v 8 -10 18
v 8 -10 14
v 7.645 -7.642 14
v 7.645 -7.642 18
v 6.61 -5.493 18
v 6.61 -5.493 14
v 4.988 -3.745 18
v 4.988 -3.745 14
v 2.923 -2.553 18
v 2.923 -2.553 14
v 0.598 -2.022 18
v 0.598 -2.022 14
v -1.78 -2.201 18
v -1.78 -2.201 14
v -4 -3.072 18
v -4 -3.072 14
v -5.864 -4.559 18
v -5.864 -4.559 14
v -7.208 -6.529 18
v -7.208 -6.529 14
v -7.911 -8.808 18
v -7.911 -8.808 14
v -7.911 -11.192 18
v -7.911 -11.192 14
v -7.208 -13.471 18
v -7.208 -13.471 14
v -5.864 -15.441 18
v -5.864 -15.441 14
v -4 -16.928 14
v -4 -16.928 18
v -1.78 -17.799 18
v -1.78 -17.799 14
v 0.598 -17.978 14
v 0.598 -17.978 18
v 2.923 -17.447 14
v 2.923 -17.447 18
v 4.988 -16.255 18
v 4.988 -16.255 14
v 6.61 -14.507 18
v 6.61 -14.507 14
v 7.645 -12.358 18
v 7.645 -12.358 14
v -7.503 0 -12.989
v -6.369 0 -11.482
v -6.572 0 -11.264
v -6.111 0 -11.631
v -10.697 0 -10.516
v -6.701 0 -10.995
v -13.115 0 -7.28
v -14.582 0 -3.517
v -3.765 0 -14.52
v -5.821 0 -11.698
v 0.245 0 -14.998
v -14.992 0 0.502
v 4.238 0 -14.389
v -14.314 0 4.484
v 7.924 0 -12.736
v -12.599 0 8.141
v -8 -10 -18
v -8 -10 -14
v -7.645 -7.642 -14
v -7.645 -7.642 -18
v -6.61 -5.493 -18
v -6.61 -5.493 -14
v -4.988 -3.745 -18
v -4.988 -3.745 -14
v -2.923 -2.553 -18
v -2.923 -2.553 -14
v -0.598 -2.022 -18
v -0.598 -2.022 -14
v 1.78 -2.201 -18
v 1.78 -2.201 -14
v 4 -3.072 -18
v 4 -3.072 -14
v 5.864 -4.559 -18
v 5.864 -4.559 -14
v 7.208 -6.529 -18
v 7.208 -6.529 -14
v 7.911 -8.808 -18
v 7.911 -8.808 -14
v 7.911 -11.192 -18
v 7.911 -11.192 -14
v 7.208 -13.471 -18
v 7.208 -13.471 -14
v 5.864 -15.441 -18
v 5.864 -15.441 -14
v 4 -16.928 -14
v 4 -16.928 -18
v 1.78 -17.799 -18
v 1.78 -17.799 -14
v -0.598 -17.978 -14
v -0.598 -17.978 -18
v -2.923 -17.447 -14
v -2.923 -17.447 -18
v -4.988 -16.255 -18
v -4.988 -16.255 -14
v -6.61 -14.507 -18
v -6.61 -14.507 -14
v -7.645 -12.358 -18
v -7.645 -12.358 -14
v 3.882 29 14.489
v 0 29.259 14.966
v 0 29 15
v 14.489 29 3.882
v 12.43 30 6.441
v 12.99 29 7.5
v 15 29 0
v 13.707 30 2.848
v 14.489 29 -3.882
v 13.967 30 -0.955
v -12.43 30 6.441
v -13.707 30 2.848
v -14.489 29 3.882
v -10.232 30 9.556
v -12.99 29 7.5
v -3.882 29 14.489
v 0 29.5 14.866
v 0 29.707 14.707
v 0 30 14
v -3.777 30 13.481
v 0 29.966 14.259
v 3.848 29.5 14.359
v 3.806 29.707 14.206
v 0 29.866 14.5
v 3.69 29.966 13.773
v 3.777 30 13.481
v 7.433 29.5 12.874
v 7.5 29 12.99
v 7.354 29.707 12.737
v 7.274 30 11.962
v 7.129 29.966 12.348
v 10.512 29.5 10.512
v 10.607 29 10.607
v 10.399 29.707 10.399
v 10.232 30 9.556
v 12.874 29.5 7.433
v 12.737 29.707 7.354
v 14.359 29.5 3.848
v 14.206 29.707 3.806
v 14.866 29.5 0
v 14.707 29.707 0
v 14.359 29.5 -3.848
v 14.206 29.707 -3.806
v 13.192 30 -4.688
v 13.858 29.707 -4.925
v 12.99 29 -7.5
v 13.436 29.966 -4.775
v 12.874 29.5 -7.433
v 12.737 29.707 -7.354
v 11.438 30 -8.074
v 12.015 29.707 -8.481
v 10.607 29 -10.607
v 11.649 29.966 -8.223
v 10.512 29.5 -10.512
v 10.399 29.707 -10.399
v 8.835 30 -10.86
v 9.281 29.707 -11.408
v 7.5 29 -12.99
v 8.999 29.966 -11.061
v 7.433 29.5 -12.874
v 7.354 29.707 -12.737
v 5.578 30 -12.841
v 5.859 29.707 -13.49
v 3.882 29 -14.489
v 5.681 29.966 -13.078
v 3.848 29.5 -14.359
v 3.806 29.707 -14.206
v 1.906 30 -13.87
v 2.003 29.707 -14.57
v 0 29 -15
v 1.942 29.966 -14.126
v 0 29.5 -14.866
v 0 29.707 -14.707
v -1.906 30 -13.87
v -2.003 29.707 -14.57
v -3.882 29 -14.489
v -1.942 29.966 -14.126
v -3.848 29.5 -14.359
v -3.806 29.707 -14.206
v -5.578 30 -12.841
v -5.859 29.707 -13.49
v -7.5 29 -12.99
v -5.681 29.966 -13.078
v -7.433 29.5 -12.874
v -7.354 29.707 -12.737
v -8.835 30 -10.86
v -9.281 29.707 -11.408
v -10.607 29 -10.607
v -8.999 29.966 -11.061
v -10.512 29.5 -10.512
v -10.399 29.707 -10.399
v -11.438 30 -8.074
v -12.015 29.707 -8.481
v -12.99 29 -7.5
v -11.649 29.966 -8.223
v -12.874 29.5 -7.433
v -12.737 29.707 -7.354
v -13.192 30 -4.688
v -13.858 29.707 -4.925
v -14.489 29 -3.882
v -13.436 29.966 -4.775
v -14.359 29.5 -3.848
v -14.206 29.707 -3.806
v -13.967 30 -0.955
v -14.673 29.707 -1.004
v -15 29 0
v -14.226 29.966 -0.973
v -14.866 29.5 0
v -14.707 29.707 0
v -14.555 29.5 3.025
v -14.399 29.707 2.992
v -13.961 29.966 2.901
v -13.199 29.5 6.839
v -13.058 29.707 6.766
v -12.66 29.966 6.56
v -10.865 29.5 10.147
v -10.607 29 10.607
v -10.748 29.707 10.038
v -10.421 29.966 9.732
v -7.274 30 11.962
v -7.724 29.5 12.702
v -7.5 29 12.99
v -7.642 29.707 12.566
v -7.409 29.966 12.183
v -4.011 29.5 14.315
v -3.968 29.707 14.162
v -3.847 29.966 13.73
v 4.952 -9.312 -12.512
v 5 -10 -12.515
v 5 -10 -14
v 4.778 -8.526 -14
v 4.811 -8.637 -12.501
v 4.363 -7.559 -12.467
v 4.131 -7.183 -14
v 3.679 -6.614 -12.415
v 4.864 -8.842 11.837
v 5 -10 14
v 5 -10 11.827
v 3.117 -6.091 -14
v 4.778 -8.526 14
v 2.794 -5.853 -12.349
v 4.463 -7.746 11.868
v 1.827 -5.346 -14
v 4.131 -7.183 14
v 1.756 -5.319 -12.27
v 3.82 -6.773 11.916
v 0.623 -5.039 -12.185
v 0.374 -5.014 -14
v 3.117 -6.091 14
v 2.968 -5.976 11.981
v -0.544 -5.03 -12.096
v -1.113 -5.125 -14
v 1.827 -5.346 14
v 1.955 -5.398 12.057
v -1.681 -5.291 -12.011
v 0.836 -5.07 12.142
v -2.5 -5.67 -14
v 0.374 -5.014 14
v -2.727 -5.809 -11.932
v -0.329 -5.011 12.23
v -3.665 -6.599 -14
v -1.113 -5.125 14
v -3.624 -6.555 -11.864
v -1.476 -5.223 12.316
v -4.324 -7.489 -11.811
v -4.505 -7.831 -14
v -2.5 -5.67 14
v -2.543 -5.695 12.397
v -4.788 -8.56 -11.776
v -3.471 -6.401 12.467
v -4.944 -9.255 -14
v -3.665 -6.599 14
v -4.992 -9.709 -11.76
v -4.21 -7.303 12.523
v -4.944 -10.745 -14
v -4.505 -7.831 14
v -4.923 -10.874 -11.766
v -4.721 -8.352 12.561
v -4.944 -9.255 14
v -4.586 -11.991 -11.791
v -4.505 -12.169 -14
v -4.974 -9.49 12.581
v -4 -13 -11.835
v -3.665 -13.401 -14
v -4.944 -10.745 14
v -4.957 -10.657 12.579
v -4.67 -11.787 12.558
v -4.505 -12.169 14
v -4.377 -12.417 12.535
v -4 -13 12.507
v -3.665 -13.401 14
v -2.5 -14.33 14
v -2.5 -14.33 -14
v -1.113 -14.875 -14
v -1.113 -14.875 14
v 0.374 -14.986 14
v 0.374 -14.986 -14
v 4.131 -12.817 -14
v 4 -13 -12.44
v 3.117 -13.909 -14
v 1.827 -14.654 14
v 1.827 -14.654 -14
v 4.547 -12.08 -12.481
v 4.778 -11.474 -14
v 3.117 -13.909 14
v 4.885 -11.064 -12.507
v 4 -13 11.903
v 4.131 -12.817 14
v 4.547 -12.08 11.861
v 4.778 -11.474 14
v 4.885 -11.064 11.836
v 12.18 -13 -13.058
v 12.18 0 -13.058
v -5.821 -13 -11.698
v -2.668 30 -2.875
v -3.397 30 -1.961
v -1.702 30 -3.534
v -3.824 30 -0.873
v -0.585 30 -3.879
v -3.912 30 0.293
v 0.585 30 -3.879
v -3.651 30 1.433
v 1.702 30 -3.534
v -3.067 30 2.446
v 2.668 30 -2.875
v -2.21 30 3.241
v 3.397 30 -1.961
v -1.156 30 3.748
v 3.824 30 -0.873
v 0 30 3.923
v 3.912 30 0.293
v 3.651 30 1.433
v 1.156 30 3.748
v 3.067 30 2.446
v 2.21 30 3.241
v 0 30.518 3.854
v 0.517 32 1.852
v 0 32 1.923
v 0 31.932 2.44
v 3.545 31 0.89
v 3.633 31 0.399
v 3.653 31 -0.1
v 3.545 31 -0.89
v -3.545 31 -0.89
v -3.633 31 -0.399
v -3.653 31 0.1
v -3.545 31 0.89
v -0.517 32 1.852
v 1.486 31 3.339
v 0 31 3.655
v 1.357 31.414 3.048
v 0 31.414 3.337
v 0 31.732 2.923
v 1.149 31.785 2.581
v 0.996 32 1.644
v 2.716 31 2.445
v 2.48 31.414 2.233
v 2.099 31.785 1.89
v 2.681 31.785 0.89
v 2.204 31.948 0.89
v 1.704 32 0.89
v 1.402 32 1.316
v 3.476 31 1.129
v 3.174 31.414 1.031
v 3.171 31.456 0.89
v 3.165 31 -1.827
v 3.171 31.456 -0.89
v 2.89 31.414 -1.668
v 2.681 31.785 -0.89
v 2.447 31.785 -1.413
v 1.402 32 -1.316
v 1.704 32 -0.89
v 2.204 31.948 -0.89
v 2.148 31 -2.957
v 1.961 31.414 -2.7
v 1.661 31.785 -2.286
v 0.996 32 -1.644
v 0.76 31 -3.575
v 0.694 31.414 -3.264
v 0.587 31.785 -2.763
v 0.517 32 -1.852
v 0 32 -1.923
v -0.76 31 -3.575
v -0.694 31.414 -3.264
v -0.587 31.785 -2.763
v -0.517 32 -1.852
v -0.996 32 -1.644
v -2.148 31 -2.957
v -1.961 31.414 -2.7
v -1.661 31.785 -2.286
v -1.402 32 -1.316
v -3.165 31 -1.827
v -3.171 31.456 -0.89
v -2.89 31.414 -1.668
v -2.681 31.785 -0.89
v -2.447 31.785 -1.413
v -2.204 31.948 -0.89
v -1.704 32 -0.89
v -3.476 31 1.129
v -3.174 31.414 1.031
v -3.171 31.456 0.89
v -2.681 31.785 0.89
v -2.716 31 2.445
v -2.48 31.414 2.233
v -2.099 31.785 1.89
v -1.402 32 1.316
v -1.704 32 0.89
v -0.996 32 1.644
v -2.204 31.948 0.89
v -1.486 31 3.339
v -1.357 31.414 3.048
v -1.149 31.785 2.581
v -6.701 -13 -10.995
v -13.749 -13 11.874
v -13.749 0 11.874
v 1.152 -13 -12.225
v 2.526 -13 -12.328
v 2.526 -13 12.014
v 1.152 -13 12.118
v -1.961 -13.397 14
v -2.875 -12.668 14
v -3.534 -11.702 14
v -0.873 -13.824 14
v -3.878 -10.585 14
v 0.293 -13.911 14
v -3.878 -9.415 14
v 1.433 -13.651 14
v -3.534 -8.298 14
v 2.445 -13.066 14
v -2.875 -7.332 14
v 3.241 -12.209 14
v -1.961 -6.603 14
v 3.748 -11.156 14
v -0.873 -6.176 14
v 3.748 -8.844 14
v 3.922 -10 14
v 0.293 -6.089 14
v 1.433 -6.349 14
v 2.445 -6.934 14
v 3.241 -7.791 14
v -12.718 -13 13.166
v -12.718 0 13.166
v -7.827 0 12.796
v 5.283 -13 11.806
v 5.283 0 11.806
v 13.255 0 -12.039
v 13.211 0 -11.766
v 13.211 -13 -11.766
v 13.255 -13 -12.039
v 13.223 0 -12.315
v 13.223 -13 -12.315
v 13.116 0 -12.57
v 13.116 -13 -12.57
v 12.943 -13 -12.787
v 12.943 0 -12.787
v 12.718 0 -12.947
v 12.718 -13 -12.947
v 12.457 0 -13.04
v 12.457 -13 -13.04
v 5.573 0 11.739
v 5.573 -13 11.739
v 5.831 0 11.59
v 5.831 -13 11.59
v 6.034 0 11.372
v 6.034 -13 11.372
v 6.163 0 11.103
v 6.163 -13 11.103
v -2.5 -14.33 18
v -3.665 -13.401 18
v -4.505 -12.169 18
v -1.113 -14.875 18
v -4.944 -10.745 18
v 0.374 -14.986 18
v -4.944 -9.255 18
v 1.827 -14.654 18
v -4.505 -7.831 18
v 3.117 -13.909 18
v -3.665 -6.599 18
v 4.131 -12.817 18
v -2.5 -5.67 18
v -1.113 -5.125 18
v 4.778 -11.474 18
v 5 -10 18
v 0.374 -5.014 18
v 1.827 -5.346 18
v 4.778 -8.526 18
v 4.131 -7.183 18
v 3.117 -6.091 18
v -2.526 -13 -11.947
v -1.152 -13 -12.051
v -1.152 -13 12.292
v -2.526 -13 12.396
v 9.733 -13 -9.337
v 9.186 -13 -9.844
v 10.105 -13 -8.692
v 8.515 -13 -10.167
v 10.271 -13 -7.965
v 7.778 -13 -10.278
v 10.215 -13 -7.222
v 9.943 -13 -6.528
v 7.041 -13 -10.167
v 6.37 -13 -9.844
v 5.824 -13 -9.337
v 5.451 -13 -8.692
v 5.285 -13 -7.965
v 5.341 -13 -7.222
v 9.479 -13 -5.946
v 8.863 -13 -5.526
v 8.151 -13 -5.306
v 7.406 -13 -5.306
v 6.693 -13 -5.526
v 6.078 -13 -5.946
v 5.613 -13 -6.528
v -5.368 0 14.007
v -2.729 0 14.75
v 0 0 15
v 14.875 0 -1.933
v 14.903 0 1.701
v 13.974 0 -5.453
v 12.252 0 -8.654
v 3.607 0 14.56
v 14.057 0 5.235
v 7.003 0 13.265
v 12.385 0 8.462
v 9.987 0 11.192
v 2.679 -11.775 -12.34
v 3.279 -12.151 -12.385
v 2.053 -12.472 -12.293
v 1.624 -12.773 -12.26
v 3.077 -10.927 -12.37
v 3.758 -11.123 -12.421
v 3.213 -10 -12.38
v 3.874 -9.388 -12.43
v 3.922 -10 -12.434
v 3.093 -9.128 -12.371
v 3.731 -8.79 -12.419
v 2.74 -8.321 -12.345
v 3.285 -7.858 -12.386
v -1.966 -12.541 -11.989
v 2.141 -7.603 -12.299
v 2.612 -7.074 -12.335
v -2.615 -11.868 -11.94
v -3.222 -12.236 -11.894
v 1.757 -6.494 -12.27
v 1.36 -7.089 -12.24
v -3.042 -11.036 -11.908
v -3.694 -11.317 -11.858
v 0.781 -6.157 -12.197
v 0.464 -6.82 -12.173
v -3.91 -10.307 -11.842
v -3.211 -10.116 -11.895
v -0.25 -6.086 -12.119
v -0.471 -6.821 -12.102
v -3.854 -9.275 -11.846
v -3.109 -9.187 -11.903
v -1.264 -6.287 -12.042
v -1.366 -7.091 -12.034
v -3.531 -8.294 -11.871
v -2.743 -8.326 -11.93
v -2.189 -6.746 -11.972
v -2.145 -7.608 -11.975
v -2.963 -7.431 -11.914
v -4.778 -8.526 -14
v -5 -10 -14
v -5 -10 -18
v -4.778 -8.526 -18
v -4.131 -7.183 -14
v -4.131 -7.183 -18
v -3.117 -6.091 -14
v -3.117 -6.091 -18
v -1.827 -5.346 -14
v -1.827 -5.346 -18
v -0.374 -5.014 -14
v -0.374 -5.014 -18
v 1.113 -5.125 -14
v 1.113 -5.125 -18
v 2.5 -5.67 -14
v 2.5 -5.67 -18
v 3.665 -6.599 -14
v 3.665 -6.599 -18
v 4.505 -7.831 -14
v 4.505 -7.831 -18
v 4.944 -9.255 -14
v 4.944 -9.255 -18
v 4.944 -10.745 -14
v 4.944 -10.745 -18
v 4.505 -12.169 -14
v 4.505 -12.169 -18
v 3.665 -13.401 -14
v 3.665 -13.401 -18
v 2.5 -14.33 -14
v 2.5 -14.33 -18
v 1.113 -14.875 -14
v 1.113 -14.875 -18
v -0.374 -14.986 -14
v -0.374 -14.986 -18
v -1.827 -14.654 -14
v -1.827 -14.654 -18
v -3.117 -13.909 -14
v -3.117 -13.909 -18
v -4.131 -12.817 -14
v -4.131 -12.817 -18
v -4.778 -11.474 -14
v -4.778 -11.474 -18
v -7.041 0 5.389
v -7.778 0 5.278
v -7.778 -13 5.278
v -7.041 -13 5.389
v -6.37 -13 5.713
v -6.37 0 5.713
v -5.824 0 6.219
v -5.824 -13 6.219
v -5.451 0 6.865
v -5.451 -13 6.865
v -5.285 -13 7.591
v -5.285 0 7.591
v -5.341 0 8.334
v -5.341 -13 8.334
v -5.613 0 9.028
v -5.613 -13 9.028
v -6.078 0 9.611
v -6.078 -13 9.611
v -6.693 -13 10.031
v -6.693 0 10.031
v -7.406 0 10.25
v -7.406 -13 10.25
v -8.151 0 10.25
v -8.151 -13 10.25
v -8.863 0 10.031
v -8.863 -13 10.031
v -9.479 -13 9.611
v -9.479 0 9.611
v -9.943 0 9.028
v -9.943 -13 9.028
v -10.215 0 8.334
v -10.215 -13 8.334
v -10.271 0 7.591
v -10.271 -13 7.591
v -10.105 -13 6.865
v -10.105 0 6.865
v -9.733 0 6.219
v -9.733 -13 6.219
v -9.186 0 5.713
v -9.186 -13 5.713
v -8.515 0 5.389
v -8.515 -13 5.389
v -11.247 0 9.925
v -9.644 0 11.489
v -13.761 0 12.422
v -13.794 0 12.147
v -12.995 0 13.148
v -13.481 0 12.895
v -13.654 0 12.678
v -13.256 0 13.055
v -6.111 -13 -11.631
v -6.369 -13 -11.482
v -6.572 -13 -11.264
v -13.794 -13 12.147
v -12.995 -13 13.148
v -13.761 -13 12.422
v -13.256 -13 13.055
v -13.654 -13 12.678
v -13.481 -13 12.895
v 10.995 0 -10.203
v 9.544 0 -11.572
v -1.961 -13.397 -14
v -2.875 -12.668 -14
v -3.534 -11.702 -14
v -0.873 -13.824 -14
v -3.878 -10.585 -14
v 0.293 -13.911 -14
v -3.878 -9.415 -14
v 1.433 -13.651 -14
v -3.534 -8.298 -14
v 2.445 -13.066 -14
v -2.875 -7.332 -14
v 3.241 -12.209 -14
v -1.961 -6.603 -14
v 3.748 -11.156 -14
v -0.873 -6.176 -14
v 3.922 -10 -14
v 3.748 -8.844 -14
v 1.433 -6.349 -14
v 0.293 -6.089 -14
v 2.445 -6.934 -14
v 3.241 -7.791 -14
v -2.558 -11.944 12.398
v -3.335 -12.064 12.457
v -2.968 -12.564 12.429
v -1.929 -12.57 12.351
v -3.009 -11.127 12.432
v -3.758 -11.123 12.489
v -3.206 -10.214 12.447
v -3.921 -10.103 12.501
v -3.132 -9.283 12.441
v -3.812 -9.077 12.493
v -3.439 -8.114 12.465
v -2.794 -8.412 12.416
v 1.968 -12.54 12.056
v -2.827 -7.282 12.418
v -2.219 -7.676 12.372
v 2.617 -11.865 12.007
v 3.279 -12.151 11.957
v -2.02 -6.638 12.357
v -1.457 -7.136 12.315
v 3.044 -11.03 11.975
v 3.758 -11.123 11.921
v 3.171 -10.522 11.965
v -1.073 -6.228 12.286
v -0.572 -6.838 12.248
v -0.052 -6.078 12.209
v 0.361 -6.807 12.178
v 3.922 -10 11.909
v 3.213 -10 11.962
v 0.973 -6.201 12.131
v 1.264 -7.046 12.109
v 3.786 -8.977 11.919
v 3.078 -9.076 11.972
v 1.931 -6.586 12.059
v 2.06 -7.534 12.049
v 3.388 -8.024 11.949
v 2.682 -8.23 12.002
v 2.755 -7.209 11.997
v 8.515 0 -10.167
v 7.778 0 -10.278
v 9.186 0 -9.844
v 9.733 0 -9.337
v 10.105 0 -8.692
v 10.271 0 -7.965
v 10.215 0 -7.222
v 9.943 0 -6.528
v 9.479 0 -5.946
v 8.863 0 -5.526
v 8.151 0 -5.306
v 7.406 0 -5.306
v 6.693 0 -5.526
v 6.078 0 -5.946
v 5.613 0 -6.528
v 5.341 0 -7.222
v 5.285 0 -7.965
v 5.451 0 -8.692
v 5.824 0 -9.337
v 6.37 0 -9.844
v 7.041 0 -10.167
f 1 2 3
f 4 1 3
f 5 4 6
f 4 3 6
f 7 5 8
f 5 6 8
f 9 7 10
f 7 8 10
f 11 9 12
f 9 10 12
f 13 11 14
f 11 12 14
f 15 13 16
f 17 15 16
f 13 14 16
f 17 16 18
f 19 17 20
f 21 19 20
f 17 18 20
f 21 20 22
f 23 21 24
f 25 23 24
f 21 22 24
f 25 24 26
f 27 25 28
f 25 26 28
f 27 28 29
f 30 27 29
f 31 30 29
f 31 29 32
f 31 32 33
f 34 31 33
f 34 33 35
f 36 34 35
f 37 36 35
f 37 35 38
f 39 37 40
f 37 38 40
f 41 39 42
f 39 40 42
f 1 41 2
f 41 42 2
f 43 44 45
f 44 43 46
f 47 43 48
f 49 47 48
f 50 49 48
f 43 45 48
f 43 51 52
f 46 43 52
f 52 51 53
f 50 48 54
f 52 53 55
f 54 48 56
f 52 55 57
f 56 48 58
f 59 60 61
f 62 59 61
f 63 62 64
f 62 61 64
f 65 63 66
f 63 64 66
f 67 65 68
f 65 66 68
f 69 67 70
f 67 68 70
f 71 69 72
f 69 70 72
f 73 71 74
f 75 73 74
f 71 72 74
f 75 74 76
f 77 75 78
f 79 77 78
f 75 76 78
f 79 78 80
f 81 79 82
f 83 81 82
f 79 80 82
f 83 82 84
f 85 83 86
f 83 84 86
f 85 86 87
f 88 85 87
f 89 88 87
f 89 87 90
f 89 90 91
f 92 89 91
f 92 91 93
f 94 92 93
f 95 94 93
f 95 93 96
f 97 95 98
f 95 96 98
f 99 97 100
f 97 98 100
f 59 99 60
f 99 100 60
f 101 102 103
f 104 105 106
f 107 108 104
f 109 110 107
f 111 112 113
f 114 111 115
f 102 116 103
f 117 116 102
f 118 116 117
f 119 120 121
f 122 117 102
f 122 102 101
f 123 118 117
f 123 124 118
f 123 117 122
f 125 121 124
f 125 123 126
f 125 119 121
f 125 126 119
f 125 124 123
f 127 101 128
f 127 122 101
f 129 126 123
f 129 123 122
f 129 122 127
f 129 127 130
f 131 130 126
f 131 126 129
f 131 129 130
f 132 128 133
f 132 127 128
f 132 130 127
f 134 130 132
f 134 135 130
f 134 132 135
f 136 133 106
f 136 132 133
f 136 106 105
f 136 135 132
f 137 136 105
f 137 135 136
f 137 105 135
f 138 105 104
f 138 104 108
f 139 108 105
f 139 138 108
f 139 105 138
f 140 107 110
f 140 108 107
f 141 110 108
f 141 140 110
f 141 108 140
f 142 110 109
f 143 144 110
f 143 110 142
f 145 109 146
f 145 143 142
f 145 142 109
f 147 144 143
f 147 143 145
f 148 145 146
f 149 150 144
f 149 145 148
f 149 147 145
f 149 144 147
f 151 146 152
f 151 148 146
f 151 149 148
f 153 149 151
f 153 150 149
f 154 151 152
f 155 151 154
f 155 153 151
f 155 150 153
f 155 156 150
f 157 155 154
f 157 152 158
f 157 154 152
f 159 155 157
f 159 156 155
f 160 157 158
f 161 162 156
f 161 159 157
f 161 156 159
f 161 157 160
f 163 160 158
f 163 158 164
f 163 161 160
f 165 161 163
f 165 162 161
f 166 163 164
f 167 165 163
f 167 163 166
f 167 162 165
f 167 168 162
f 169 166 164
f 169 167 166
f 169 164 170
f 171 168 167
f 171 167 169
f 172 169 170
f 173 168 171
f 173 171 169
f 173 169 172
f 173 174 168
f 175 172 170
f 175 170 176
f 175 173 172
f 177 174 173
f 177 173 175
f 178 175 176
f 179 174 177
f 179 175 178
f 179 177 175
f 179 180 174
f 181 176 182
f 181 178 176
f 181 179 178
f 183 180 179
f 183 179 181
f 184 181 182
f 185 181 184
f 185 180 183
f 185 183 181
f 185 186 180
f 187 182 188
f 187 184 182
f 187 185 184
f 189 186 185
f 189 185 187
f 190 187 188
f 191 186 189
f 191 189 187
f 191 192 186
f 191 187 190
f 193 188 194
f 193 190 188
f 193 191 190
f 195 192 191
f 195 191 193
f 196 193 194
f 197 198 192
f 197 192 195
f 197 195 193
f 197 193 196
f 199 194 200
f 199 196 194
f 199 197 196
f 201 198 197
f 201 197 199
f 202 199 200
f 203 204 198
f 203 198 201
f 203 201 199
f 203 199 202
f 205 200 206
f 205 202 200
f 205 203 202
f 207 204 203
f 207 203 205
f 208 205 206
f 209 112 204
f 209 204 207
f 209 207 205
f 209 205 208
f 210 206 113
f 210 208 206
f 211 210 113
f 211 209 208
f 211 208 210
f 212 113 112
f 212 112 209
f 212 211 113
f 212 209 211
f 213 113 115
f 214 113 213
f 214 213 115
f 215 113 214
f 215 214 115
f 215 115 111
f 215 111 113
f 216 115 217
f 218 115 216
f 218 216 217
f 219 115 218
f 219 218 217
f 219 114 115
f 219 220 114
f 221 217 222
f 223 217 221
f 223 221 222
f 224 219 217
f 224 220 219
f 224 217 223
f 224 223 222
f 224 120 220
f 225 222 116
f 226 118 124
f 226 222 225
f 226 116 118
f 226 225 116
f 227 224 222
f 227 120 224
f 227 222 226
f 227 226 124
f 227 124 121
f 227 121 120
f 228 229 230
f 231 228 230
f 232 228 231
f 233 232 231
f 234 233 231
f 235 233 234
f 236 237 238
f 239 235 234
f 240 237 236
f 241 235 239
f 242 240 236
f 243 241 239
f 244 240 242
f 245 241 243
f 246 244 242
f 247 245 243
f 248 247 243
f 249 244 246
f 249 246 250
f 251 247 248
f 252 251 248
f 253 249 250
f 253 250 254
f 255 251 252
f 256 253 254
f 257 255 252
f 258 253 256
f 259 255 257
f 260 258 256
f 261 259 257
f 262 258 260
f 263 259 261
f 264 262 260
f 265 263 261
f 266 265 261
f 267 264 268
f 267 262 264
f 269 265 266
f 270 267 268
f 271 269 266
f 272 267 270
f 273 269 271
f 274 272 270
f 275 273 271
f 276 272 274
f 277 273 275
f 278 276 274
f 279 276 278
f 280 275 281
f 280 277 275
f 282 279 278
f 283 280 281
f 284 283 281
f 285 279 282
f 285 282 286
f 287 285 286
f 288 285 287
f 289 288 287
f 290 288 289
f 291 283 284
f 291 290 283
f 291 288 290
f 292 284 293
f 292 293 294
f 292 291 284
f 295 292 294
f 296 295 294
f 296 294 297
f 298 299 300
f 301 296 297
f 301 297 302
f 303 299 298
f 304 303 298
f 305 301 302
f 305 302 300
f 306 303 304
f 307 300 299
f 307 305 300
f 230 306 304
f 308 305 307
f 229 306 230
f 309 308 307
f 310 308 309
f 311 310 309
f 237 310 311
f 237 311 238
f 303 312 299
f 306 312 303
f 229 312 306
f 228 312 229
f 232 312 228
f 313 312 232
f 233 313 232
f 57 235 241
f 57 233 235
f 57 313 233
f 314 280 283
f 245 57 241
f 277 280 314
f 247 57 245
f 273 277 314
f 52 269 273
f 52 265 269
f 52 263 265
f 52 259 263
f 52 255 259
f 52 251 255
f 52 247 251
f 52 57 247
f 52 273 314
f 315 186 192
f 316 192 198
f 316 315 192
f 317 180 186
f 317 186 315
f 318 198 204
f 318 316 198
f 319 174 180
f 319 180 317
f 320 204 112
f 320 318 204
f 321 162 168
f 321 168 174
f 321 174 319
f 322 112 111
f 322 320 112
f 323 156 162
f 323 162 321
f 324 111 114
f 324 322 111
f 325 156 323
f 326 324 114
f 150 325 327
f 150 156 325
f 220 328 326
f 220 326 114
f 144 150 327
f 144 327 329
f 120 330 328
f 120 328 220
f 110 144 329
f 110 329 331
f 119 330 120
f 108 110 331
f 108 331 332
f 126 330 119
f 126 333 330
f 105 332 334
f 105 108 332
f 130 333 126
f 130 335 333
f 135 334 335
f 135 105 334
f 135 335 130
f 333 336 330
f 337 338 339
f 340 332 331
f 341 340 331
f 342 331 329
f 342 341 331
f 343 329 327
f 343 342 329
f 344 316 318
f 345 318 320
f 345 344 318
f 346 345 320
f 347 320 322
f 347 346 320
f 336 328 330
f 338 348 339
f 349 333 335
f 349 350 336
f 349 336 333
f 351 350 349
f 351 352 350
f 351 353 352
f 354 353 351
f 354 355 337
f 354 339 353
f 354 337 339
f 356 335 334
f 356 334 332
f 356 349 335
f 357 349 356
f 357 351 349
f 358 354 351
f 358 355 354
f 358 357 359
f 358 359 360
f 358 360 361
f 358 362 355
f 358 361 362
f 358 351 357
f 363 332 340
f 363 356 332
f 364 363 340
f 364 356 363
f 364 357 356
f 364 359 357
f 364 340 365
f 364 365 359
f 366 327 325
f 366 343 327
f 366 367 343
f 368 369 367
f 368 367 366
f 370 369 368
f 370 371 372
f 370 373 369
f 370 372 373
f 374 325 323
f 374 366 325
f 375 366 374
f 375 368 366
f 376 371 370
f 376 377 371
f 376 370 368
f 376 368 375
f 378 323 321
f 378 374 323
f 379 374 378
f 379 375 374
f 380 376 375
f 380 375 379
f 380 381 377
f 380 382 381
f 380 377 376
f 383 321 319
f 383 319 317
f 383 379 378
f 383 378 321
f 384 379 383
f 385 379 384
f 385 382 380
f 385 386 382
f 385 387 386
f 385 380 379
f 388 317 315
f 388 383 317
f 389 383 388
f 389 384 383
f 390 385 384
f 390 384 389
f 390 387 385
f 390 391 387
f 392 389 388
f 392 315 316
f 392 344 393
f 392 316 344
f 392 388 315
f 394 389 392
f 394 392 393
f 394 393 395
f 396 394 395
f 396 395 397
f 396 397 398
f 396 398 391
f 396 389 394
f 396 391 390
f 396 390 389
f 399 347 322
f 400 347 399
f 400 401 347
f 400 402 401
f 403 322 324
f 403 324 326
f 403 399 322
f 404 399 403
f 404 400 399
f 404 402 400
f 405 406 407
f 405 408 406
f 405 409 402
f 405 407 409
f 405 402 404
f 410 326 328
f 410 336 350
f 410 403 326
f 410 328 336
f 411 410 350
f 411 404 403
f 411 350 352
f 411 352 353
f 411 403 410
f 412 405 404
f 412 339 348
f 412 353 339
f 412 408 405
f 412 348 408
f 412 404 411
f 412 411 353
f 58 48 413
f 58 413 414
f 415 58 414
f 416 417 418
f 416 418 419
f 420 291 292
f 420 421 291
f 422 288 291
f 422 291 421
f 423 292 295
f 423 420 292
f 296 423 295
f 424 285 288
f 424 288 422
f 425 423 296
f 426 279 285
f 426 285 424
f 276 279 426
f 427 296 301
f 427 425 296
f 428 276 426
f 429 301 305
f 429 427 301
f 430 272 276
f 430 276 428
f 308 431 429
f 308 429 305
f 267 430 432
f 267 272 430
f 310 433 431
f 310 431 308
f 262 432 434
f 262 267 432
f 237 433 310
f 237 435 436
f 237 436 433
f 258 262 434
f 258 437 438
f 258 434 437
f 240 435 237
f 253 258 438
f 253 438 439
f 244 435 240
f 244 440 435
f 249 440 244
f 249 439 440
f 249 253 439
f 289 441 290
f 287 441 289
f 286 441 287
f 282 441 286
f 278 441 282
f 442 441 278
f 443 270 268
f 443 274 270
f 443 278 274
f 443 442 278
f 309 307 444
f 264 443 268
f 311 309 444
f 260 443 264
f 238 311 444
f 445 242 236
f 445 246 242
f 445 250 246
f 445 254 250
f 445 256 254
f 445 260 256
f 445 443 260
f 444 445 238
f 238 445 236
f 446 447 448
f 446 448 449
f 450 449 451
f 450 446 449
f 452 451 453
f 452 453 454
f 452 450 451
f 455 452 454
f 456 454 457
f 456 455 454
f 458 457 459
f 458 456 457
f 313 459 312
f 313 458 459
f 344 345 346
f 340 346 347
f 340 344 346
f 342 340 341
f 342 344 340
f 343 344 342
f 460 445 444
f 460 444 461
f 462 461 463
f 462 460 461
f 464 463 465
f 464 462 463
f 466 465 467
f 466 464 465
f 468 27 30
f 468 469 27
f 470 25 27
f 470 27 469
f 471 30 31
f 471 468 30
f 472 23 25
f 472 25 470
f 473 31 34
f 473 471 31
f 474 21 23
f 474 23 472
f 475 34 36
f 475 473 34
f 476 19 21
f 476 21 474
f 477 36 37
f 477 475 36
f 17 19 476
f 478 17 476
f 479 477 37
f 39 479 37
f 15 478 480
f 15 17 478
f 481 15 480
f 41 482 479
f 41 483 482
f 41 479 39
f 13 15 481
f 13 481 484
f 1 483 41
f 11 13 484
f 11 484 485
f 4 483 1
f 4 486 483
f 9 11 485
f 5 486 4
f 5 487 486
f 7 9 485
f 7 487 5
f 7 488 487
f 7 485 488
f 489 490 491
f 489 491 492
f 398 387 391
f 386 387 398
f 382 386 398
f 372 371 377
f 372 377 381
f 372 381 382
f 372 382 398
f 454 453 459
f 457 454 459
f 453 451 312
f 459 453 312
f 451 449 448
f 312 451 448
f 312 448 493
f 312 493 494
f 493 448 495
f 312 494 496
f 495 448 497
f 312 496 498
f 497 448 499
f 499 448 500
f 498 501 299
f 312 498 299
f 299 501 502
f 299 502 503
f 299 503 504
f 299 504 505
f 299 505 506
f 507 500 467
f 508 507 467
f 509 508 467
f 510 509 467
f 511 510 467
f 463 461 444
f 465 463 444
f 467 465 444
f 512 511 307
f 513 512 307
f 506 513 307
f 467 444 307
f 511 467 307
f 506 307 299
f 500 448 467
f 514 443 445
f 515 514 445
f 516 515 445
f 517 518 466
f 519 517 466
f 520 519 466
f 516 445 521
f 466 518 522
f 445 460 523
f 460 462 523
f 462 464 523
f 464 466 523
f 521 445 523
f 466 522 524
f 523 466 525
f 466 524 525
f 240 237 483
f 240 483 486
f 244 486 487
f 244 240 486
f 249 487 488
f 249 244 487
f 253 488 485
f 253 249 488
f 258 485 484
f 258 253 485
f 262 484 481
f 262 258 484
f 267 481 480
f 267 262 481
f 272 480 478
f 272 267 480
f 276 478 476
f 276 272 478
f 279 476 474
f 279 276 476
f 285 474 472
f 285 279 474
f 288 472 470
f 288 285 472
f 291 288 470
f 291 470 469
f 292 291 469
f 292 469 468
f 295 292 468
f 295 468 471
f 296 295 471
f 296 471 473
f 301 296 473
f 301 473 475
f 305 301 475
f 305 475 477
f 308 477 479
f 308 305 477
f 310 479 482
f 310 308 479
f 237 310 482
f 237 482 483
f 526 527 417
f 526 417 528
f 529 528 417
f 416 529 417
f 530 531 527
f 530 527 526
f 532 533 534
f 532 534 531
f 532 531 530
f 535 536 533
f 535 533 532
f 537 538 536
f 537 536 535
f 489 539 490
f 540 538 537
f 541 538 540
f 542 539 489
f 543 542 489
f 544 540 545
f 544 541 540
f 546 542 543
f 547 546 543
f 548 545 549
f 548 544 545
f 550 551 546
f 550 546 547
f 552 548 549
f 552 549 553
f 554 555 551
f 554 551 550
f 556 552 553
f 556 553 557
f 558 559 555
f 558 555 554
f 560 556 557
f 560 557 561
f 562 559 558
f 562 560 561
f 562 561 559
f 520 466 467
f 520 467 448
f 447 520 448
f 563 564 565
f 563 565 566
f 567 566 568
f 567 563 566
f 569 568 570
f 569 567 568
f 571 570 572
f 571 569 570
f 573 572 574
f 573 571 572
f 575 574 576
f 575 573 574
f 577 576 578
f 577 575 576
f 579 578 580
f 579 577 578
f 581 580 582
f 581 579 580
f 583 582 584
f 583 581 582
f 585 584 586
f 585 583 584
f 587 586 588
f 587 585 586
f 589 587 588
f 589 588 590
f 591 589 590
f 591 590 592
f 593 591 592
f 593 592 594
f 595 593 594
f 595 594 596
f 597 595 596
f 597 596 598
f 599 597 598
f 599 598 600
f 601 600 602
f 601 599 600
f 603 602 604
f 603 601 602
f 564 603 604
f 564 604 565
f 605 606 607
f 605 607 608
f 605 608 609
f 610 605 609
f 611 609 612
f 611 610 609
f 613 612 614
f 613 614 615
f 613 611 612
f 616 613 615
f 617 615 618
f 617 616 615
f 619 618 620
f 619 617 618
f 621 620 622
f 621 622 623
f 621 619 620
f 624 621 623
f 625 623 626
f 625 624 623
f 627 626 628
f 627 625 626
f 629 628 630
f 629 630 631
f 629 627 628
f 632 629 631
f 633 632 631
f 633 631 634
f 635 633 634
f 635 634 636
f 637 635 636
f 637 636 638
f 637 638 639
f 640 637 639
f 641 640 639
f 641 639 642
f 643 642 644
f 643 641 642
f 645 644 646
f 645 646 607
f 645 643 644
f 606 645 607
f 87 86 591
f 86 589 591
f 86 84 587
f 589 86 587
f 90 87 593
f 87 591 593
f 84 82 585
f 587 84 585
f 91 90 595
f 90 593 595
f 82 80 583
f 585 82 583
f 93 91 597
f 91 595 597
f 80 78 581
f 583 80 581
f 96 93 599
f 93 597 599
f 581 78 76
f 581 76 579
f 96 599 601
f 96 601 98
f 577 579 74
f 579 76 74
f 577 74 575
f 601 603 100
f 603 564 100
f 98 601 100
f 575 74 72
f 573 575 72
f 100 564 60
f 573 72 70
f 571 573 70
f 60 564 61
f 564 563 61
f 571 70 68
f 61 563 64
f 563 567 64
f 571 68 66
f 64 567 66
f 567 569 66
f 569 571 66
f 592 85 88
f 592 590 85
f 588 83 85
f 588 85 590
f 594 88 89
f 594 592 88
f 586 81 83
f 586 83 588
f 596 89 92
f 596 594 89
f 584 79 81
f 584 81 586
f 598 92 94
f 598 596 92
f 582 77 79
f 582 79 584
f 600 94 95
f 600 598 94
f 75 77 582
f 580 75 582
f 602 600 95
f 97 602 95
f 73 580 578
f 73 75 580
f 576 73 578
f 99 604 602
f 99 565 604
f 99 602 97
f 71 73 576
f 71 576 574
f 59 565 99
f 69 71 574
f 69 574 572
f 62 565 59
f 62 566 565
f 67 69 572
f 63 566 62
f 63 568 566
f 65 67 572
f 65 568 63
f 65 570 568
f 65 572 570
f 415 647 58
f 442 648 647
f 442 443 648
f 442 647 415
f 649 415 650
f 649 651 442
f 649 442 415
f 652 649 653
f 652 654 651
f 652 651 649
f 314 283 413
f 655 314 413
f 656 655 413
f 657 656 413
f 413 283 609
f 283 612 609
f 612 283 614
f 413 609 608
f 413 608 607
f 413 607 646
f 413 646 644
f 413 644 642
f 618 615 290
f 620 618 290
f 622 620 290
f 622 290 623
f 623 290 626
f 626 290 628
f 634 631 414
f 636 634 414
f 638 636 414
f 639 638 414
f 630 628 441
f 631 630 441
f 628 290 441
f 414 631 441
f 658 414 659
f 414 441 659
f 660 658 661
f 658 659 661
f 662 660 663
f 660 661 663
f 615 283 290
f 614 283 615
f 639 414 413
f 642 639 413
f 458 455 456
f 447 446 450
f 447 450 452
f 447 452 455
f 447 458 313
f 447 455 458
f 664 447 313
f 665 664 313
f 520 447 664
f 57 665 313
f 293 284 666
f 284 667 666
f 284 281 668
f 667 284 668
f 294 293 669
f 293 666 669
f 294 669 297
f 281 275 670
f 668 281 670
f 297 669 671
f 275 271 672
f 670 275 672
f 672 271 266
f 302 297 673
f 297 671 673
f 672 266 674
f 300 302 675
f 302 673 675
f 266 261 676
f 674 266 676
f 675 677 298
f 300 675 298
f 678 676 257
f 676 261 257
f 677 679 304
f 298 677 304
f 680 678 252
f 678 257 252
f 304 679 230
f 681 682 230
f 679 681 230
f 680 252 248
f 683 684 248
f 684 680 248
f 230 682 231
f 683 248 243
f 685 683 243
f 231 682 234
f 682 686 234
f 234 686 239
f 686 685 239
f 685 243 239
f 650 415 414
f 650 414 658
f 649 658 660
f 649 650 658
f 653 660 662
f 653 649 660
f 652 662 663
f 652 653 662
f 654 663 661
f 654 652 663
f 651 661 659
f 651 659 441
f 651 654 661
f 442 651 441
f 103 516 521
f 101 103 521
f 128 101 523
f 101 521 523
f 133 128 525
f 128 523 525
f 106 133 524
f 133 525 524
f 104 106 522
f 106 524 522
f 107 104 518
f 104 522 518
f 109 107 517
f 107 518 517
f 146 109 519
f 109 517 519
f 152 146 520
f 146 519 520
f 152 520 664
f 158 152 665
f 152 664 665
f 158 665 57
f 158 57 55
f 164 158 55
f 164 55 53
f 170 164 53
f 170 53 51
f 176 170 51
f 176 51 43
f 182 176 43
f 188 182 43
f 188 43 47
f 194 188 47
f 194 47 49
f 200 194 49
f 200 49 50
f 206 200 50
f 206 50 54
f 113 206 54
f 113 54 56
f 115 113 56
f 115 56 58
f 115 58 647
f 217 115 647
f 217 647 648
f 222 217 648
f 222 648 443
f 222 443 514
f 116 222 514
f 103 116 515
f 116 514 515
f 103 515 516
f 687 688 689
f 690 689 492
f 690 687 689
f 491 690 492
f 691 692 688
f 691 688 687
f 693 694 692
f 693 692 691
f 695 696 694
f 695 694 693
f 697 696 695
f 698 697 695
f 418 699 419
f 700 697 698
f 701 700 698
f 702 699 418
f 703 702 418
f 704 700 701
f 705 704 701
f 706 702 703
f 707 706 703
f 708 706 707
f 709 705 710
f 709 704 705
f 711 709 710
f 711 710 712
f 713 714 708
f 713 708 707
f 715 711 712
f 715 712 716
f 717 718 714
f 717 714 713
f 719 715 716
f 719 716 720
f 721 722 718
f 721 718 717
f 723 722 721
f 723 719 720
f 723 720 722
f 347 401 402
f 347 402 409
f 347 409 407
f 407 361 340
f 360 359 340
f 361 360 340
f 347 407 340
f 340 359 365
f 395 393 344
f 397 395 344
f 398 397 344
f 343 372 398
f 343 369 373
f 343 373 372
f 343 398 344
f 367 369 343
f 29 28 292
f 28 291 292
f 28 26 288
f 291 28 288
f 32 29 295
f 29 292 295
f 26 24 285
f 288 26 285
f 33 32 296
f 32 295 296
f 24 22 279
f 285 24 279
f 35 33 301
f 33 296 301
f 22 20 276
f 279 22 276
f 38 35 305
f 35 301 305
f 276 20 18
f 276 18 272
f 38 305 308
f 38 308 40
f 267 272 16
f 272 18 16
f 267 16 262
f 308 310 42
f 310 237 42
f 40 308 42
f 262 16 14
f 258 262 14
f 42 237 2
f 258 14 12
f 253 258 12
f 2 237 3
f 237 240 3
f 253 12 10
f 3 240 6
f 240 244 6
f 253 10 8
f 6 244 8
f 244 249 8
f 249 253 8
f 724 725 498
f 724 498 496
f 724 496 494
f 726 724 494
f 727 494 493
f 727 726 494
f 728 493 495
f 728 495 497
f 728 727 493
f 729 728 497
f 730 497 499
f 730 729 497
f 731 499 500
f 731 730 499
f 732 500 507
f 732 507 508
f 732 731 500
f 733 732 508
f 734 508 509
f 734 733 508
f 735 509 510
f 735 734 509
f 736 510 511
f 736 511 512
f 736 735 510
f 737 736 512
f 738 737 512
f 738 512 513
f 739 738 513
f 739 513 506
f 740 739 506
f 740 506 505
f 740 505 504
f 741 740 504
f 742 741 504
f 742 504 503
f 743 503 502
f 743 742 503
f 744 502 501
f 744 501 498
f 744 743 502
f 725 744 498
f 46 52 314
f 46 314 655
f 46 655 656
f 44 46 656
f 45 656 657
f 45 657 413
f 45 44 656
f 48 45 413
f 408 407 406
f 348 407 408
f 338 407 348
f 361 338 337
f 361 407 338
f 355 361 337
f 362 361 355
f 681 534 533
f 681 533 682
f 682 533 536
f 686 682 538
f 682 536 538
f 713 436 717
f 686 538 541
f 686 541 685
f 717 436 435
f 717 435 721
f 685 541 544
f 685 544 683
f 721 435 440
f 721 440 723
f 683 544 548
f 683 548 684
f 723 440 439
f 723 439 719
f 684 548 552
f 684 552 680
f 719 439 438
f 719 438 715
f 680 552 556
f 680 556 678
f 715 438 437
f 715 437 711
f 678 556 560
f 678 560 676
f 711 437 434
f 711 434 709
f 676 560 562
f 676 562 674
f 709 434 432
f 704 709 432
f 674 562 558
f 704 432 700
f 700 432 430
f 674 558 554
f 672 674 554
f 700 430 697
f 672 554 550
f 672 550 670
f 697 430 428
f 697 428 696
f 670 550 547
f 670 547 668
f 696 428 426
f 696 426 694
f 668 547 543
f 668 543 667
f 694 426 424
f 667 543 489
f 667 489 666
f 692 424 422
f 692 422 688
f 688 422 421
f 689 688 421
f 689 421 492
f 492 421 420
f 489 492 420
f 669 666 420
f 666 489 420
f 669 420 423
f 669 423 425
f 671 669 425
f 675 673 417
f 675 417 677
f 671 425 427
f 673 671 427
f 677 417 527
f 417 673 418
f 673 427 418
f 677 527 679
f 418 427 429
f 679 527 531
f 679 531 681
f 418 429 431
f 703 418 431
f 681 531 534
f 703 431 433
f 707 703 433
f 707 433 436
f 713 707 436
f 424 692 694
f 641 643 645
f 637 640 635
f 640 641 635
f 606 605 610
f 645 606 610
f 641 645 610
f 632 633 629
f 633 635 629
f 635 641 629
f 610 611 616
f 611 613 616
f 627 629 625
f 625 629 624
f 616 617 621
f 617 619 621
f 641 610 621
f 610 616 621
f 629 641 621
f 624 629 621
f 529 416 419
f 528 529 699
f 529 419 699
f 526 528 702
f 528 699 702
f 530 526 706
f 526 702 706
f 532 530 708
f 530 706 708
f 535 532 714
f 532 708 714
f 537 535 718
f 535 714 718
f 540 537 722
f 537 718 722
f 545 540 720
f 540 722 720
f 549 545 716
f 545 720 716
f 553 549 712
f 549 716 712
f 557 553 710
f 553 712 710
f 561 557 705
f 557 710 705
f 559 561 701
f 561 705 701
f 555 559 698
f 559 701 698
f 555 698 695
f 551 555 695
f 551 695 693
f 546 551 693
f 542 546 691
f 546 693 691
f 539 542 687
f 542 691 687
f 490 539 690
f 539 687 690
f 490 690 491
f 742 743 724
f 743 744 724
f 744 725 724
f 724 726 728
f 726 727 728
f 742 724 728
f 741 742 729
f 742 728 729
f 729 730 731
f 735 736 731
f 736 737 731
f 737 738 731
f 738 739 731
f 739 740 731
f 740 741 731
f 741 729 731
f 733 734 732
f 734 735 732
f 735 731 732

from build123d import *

# Parameters (mm, degrees)
SKETCH1_R           = 15
BOSS_EXTRUDE1_DEPTH = 30
SKETCH2_R           = 2.5
BOSS_EXTRUDE2_DEPTH = 13
SKETCH3_R           = 5
SKETCH3_R_2         = 3.92199541
BOSS_EXTRUDE3_DEPTH = 28
SKETCH4_R           = 3.213422936
CUT_EXTRUDE1_DEPTH  = 45.339598555
FILLET2_R           = 1
SKETCH5_R           = 8
SKETCH5_R_2         = 5
BOSS_EXTRUDE4_DEPTH = 4
SKETCH6_R           = 8
SKETCH6_R_2         = 5
BOSS_EXTRUDE6_DEPTH = 4
SKETCH8_R           = 3.922583836
BOSS_EXTRUDE7_DEPTH = 2
FILLET3_R           = 2
SKETCH9_W           = 8.867784407
SKETCH9_H           = 1.779822502
CUT_EXTRUDE3_DEPTH  = 1


with BuildPart() as part:
    # Sketch1 → Boss-Extrude1 (new body)
    with BuildSketch(Plane(origin=(0, 0, 0), x_dir=(1, 0, 0), z_dir=(0, 1, 0))):
        with Locations(Location((0, 0, 0), (0, 0, 270))):
            Circle(SKETCH1_R)
    extrude(amount=BOSS_EXTRUDE1_DEPTH)

    # Sketch2 → Boss-Extrude2 (add)
    with BuildSketch(Plane.XZ):
        with BuildLine():
            Line((-12.718406511, 13.165617512), (5.282689871, 11.805772831))
            ThreePointArc((5.282689871, 11.805772831), (5.831177604, 11.59018569), (6.163003877, 11.10314572))
            Line((6.163003877, 11.10314572), (13.211347203, -11.766006614))
            ThreePointArc((13.211347203, -11.766006614), (13.037277191, -12.684353766), (12.180377802, -13.057697169))
            Line((12.180377802, -13.057697169), (-5.82071858, -11.697852488))
            ThreePointArc((-5.82071858, -11.697852488), (-6.369206312, -11.482265347), (-6.701032586, -10.995225377))
            Line((-6.701032586, -10.995225377), (-13.749375911, 11.873926957))
            ThreePointArc((-13.749375911, 11.873926957), (-13.5753059, 12.792274109), (-12.718406511, 13.165617512))
        make_face()
        with Locations(Location((-7.778174593, 7.778174593, 0), (0, 0, 270))):
            Circle(SKETCH2_R, mode=Mode.SUBTRACT)
        with Locations(Location((7.778174593, -7.778174593, 0), (0, 0, 270))):
            Circle(SKETCH2_R, mode=Mode.SUBTRACT)
    extrude(amount=BOSS_EXTRUDE2_DEPTH)

    # Sketch3 → Boss-Extrude3 (add)
    with BuildSketch(Plane.XY.offset(14)):
        with Locations((0, -10)):
            Circle(SKETCH3_R)
        with Locations((0, -10)):
            Circle(SKETCH3_R_2, mode=Mode.SUBTRACT)
    extrude(amount=-BOSS_EXTRUDE3_DEPTH)

    # Sketch4 → Cut-Extrude1 (cut, through all)
    with BuildSketch(Plane.XY.offset(14)):
        with Locations((0, -10)):
            Circle(SKETCH4_R)
    extrude(amount=-CUT_EXTRUDE1_DEPTH, mode=Mode.SUBTRACT)

    # Fillet2
    fillet2_edges = [part.edges().sort_by_distance(p)[0] for p in [
        (0, 30, -15),
    ]]
    fillet(fillet2_edges, radius=FILLET2_R)

    # Sketch8 → Boss-Extrude7 (add)
    with BuildSketch(Plane(origin=(0, 30, 0), x_dir=(1, 0, 0), z_dir=(0, 1, 0))):
        with Locations(Location((0, 0, 0), (0, 0, 270))):
            Circle(SKETCH8_R)
    extrude(amount=BOSS_EXTRUDE7_DEPTH)

    # Fillet3
    fillet3_edges = [part.edges().sort_by_distance(p)[0] for p in [
        (0, 32, -3.922583836),
    ]]
    fillet(fillet3_edges, radius=FILLET3_R - 0.0001)  # a hair under: the kernel refuses the full size

    # Sketch9 → Cut-Extrude3 (cut)
    with BuildSketch(Plane(origin=(0, 32, 0), x_dir=(1, 0, 0), z_dir=(0, 1, 0))):
        with Locations((-0.068002485, 0)):
            Rectangle(SKETCH9_W, SKETCH9_H)
    extrude(amount=-CUT_EXTRUDE3_DEPTH, mode=Mode.SUBTRACT)


with BuildPart() as body_2:
    # Sketch5 → Boss-Extrude4 (new body)
    with BuildSketch(Plane(origin=(0, 0, -14), x_dir=(-1, 0, 0), z_dir=(0, 0, -1))):
        with Locations((0, -10)):
            Circle(SKETCH5_R)
        with Locations((0, -10)):
            Circle(SKETCH5_R_2, mode=Mode.SUBTRACT)
    extrude(amount=BOSS_EXTRUDE4_DEPTH)


with BuildPart() as body_3:
    # Sketch6 → Boss-Extrude6 (new body)
    with BuildSketch(Plane.XY.offset(14)):
        with Locations((0, -10)):
            Circle(SKETCH6_R)
        with Locations((0, -10)):
            Circle(SKETCH6_R_2, mode=Mode.SUBTRACT)
    extrude(amount=BOSS_EXTRUDE6_DEPTH)


solid = Compound([part.part, body_2.part, body_3.part])
